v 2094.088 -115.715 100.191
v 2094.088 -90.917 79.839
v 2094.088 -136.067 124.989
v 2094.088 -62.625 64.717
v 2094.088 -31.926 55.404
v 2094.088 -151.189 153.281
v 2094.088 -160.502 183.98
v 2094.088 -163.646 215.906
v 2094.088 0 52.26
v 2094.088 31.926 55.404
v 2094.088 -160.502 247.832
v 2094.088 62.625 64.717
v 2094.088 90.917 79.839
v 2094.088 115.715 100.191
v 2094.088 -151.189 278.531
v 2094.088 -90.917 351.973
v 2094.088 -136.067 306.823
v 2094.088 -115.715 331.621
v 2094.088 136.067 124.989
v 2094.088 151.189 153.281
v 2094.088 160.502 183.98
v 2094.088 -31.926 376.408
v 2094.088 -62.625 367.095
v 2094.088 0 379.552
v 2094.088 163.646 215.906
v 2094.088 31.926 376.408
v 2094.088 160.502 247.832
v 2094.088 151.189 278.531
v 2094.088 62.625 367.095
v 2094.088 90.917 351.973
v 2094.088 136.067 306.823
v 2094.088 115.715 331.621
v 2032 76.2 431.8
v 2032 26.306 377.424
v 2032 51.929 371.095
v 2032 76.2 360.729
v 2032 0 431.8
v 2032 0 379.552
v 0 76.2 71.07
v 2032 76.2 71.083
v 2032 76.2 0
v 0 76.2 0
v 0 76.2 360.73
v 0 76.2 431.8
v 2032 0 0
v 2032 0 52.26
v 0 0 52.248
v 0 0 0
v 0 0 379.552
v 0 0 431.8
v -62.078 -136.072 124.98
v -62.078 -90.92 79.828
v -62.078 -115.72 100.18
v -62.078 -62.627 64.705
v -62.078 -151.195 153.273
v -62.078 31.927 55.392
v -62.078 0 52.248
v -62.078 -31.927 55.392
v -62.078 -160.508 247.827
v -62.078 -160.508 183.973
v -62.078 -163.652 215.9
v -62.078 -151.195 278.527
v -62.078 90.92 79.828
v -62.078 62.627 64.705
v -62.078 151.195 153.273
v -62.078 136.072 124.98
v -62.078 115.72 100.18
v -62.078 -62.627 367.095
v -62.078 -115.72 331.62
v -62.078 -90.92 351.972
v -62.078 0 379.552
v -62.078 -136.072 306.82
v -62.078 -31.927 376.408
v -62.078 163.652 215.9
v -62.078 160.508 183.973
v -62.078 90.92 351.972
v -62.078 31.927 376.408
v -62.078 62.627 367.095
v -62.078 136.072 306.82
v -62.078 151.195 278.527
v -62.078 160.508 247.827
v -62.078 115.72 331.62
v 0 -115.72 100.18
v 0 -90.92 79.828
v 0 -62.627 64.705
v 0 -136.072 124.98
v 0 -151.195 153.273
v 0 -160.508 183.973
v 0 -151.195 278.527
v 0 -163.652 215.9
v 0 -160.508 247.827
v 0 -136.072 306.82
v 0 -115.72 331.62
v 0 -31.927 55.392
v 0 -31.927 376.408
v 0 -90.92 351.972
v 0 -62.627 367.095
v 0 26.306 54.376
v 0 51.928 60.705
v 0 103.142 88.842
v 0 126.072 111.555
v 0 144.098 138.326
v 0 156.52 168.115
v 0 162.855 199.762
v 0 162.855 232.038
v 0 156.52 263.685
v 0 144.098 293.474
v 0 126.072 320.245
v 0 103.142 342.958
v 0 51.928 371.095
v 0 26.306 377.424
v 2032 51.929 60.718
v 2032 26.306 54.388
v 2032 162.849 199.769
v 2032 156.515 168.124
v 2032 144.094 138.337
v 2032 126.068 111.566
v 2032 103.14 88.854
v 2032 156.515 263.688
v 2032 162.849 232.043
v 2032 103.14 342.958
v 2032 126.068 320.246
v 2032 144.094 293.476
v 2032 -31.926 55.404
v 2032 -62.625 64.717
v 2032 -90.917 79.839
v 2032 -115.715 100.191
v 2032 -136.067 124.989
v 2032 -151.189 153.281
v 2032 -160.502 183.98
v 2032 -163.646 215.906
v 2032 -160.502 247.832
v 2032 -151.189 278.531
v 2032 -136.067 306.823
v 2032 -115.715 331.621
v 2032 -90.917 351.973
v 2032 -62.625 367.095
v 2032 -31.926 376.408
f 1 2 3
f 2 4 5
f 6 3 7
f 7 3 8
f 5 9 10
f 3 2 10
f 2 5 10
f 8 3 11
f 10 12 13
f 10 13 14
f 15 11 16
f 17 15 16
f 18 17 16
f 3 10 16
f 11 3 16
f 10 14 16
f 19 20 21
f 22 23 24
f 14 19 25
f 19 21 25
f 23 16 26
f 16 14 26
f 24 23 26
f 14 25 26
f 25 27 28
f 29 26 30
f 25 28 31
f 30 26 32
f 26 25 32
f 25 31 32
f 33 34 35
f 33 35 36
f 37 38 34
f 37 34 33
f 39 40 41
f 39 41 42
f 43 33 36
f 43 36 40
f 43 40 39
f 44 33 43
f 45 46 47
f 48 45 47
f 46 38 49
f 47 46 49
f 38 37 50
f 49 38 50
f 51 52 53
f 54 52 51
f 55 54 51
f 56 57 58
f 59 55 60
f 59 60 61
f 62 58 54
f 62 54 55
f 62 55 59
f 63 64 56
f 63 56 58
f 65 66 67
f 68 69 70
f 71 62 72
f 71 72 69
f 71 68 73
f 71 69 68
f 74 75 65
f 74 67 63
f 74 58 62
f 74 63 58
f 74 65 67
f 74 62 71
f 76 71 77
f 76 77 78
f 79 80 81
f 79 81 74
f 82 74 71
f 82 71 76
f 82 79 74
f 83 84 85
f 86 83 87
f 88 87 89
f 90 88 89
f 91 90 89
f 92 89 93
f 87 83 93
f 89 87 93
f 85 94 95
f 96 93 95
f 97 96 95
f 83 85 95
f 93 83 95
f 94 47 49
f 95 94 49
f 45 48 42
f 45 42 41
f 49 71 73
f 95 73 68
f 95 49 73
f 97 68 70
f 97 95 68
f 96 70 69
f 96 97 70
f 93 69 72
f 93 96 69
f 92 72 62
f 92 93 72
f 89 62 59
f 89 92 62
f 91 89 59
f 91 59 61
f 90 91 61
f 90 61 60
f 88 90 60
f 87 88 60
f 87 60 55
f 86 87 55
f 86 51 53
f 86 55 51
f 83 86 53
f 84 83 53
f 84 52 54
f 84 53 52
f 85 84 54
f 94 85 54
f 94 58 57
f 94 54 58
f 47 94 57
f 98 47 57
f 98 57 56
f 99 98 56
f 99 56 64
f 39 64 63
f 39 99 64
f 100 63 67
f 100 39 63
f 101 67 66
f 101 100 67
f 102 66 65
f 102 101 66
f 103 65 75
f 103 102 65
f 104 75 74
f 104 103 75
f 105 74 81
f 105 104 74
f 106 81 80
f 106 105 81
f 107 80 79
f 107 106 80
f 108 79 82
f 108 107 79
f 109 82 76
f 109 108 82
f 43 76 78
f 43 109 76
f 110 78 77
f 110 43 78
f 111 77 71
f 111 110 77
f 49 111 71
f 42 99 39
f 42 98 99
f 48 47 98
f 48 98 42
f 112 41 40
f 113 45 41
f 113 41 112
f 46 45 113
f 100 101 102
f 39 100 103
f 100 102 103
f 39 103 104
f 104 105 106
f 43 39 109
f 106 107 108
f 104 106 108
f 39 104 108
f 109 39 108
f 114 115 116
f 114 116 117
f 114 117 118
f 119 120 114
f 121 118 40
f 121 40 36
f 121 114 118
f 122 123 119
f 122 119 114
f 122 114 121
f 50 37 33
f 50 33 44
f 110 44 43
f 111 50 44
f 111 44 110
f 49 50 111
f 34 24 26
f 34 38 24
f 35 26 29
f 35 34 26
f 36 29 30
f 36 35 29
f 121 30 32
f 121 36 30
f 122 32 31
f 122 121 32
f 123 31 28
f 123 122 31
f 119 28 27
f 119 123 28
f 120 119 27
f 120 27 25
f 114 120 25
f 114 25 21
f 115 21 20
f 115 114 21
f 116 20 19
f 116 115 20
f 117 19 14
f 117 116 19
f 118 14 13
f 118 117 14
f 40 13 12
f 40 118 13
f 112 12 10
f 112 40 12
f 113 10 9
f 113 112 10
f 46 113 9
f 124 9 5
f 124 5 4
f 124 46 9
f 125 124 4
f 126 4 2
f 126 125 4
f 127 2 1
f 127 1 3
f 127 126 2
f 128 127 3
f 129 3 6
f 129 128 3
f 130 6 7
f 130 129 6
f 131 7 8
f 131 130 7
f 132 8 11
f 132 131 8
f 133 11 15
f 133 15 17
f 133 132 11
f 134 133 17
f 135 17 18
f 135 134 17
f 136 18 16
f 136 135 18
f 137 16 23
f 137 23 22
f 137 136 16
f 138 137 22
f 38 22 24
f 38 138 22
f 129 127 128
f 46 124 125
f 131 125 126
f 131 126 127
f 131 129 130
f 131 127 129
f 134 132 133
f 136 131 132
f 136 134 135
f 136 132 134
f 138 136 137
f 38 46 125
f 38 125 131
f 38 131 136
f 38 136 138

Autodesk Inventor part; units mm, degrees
ref_plane "YZ Plane" through (0, 0, 0) normal (1, 0, 0) x (0, 1, 0)
ref_plane "XZ Plane" through (0, 0, 0) normal (0, 1, 0) x (-1, 0, 0)
ref_plane "XY Plane" through (0, 0, 0) normal (0, 0, 1) x (1, 0, 0)
sketch "Sketch1" plane through (0, 0, 0) normal (0, 1, 0) x (-1, 0, 0)
  line L0 (0, 0) -> (-2032, 0)
  line L1 (-2032, 0) -> (-2032, 431.8)
  line L2 (-2032, 431.8) -> (0, 431.8)
  line L3 (0, 431.8) -> (0, 0)
  dimension "d0" = 2032
  dimension "d1" = 431.8
extrude "Extrusion1" add sketch "Sketch1" along normal blind 76.2
sketch "Sketch2" plane through (0, 0, 0) normal (0, -1, 0) x (1, 0, 0)
  line L0 (2094.0877, 379.5522) -> (2032, 379.5522)
  line L1 (2032, 0) -> (0, 0) projected
  line L2 (0, 431.8) -> (2032, 431.8) projected
  line L3 (-62.0877, 379.5522) -> (0, 379.5522)
  line L4 (2094.0877, 215.9061) -> (2032, 215.9061)
  line L5 (0, 215.9) -> (-62.0877, 215.9061)
  line L6 (2094.0877, 379.5522) -> (2094.0877, 215.9061)
  line L7 (2032, 215.9061) -> (2032, 379.5522)
  line L8 (2032, 431.8) -> (2032, 0) projected
  line L9 (0, 215.9) -> (0, 379.5522)
  line L10 (0, 0) -> (0, 431.8) projected
  line L11 (-62.0877, 215.9061) -> (-62.0877, 379.5522)
  point P0 (2063.0438, 379.5522)
revolve "Revolution1" add sketch "Sketch2" angle 360 about axis through (2094.0877, 0, 215.9061) along (-1, 0, 0) contours L6 L4 L7 L0
sketch "Sketch3" plane through (0, 0, 0) normal (0, -1, 0) x (1, 0, 0)
  line L0 (0, 215.9) -> (-62.0776, 215.9)
  line L1 (0, 431.8) -> (2032, 431.8) projected
  line L2 (0, 431.8) -> (0, 379.5522)
  line L3 (0, 215.9) -> (0, 379.5522)
  line L4 (-62.0776, 215.9) -> (-62.0776, 379.5522)
  line L5 (-62.0776, 379.5522) -> (0, 379.5522)
  point P0 (-31.0388, 431.8)
  dimension "d7" = 62.0776
  dimension "d10" = 215.9
revolve "Revolution2" add sketch "Sketch3" angle 360 about axis through (0, 0, 215.9) along (-1, 0, 0)
properties part number "Solor Cleaner - Solor Panal Bace"
